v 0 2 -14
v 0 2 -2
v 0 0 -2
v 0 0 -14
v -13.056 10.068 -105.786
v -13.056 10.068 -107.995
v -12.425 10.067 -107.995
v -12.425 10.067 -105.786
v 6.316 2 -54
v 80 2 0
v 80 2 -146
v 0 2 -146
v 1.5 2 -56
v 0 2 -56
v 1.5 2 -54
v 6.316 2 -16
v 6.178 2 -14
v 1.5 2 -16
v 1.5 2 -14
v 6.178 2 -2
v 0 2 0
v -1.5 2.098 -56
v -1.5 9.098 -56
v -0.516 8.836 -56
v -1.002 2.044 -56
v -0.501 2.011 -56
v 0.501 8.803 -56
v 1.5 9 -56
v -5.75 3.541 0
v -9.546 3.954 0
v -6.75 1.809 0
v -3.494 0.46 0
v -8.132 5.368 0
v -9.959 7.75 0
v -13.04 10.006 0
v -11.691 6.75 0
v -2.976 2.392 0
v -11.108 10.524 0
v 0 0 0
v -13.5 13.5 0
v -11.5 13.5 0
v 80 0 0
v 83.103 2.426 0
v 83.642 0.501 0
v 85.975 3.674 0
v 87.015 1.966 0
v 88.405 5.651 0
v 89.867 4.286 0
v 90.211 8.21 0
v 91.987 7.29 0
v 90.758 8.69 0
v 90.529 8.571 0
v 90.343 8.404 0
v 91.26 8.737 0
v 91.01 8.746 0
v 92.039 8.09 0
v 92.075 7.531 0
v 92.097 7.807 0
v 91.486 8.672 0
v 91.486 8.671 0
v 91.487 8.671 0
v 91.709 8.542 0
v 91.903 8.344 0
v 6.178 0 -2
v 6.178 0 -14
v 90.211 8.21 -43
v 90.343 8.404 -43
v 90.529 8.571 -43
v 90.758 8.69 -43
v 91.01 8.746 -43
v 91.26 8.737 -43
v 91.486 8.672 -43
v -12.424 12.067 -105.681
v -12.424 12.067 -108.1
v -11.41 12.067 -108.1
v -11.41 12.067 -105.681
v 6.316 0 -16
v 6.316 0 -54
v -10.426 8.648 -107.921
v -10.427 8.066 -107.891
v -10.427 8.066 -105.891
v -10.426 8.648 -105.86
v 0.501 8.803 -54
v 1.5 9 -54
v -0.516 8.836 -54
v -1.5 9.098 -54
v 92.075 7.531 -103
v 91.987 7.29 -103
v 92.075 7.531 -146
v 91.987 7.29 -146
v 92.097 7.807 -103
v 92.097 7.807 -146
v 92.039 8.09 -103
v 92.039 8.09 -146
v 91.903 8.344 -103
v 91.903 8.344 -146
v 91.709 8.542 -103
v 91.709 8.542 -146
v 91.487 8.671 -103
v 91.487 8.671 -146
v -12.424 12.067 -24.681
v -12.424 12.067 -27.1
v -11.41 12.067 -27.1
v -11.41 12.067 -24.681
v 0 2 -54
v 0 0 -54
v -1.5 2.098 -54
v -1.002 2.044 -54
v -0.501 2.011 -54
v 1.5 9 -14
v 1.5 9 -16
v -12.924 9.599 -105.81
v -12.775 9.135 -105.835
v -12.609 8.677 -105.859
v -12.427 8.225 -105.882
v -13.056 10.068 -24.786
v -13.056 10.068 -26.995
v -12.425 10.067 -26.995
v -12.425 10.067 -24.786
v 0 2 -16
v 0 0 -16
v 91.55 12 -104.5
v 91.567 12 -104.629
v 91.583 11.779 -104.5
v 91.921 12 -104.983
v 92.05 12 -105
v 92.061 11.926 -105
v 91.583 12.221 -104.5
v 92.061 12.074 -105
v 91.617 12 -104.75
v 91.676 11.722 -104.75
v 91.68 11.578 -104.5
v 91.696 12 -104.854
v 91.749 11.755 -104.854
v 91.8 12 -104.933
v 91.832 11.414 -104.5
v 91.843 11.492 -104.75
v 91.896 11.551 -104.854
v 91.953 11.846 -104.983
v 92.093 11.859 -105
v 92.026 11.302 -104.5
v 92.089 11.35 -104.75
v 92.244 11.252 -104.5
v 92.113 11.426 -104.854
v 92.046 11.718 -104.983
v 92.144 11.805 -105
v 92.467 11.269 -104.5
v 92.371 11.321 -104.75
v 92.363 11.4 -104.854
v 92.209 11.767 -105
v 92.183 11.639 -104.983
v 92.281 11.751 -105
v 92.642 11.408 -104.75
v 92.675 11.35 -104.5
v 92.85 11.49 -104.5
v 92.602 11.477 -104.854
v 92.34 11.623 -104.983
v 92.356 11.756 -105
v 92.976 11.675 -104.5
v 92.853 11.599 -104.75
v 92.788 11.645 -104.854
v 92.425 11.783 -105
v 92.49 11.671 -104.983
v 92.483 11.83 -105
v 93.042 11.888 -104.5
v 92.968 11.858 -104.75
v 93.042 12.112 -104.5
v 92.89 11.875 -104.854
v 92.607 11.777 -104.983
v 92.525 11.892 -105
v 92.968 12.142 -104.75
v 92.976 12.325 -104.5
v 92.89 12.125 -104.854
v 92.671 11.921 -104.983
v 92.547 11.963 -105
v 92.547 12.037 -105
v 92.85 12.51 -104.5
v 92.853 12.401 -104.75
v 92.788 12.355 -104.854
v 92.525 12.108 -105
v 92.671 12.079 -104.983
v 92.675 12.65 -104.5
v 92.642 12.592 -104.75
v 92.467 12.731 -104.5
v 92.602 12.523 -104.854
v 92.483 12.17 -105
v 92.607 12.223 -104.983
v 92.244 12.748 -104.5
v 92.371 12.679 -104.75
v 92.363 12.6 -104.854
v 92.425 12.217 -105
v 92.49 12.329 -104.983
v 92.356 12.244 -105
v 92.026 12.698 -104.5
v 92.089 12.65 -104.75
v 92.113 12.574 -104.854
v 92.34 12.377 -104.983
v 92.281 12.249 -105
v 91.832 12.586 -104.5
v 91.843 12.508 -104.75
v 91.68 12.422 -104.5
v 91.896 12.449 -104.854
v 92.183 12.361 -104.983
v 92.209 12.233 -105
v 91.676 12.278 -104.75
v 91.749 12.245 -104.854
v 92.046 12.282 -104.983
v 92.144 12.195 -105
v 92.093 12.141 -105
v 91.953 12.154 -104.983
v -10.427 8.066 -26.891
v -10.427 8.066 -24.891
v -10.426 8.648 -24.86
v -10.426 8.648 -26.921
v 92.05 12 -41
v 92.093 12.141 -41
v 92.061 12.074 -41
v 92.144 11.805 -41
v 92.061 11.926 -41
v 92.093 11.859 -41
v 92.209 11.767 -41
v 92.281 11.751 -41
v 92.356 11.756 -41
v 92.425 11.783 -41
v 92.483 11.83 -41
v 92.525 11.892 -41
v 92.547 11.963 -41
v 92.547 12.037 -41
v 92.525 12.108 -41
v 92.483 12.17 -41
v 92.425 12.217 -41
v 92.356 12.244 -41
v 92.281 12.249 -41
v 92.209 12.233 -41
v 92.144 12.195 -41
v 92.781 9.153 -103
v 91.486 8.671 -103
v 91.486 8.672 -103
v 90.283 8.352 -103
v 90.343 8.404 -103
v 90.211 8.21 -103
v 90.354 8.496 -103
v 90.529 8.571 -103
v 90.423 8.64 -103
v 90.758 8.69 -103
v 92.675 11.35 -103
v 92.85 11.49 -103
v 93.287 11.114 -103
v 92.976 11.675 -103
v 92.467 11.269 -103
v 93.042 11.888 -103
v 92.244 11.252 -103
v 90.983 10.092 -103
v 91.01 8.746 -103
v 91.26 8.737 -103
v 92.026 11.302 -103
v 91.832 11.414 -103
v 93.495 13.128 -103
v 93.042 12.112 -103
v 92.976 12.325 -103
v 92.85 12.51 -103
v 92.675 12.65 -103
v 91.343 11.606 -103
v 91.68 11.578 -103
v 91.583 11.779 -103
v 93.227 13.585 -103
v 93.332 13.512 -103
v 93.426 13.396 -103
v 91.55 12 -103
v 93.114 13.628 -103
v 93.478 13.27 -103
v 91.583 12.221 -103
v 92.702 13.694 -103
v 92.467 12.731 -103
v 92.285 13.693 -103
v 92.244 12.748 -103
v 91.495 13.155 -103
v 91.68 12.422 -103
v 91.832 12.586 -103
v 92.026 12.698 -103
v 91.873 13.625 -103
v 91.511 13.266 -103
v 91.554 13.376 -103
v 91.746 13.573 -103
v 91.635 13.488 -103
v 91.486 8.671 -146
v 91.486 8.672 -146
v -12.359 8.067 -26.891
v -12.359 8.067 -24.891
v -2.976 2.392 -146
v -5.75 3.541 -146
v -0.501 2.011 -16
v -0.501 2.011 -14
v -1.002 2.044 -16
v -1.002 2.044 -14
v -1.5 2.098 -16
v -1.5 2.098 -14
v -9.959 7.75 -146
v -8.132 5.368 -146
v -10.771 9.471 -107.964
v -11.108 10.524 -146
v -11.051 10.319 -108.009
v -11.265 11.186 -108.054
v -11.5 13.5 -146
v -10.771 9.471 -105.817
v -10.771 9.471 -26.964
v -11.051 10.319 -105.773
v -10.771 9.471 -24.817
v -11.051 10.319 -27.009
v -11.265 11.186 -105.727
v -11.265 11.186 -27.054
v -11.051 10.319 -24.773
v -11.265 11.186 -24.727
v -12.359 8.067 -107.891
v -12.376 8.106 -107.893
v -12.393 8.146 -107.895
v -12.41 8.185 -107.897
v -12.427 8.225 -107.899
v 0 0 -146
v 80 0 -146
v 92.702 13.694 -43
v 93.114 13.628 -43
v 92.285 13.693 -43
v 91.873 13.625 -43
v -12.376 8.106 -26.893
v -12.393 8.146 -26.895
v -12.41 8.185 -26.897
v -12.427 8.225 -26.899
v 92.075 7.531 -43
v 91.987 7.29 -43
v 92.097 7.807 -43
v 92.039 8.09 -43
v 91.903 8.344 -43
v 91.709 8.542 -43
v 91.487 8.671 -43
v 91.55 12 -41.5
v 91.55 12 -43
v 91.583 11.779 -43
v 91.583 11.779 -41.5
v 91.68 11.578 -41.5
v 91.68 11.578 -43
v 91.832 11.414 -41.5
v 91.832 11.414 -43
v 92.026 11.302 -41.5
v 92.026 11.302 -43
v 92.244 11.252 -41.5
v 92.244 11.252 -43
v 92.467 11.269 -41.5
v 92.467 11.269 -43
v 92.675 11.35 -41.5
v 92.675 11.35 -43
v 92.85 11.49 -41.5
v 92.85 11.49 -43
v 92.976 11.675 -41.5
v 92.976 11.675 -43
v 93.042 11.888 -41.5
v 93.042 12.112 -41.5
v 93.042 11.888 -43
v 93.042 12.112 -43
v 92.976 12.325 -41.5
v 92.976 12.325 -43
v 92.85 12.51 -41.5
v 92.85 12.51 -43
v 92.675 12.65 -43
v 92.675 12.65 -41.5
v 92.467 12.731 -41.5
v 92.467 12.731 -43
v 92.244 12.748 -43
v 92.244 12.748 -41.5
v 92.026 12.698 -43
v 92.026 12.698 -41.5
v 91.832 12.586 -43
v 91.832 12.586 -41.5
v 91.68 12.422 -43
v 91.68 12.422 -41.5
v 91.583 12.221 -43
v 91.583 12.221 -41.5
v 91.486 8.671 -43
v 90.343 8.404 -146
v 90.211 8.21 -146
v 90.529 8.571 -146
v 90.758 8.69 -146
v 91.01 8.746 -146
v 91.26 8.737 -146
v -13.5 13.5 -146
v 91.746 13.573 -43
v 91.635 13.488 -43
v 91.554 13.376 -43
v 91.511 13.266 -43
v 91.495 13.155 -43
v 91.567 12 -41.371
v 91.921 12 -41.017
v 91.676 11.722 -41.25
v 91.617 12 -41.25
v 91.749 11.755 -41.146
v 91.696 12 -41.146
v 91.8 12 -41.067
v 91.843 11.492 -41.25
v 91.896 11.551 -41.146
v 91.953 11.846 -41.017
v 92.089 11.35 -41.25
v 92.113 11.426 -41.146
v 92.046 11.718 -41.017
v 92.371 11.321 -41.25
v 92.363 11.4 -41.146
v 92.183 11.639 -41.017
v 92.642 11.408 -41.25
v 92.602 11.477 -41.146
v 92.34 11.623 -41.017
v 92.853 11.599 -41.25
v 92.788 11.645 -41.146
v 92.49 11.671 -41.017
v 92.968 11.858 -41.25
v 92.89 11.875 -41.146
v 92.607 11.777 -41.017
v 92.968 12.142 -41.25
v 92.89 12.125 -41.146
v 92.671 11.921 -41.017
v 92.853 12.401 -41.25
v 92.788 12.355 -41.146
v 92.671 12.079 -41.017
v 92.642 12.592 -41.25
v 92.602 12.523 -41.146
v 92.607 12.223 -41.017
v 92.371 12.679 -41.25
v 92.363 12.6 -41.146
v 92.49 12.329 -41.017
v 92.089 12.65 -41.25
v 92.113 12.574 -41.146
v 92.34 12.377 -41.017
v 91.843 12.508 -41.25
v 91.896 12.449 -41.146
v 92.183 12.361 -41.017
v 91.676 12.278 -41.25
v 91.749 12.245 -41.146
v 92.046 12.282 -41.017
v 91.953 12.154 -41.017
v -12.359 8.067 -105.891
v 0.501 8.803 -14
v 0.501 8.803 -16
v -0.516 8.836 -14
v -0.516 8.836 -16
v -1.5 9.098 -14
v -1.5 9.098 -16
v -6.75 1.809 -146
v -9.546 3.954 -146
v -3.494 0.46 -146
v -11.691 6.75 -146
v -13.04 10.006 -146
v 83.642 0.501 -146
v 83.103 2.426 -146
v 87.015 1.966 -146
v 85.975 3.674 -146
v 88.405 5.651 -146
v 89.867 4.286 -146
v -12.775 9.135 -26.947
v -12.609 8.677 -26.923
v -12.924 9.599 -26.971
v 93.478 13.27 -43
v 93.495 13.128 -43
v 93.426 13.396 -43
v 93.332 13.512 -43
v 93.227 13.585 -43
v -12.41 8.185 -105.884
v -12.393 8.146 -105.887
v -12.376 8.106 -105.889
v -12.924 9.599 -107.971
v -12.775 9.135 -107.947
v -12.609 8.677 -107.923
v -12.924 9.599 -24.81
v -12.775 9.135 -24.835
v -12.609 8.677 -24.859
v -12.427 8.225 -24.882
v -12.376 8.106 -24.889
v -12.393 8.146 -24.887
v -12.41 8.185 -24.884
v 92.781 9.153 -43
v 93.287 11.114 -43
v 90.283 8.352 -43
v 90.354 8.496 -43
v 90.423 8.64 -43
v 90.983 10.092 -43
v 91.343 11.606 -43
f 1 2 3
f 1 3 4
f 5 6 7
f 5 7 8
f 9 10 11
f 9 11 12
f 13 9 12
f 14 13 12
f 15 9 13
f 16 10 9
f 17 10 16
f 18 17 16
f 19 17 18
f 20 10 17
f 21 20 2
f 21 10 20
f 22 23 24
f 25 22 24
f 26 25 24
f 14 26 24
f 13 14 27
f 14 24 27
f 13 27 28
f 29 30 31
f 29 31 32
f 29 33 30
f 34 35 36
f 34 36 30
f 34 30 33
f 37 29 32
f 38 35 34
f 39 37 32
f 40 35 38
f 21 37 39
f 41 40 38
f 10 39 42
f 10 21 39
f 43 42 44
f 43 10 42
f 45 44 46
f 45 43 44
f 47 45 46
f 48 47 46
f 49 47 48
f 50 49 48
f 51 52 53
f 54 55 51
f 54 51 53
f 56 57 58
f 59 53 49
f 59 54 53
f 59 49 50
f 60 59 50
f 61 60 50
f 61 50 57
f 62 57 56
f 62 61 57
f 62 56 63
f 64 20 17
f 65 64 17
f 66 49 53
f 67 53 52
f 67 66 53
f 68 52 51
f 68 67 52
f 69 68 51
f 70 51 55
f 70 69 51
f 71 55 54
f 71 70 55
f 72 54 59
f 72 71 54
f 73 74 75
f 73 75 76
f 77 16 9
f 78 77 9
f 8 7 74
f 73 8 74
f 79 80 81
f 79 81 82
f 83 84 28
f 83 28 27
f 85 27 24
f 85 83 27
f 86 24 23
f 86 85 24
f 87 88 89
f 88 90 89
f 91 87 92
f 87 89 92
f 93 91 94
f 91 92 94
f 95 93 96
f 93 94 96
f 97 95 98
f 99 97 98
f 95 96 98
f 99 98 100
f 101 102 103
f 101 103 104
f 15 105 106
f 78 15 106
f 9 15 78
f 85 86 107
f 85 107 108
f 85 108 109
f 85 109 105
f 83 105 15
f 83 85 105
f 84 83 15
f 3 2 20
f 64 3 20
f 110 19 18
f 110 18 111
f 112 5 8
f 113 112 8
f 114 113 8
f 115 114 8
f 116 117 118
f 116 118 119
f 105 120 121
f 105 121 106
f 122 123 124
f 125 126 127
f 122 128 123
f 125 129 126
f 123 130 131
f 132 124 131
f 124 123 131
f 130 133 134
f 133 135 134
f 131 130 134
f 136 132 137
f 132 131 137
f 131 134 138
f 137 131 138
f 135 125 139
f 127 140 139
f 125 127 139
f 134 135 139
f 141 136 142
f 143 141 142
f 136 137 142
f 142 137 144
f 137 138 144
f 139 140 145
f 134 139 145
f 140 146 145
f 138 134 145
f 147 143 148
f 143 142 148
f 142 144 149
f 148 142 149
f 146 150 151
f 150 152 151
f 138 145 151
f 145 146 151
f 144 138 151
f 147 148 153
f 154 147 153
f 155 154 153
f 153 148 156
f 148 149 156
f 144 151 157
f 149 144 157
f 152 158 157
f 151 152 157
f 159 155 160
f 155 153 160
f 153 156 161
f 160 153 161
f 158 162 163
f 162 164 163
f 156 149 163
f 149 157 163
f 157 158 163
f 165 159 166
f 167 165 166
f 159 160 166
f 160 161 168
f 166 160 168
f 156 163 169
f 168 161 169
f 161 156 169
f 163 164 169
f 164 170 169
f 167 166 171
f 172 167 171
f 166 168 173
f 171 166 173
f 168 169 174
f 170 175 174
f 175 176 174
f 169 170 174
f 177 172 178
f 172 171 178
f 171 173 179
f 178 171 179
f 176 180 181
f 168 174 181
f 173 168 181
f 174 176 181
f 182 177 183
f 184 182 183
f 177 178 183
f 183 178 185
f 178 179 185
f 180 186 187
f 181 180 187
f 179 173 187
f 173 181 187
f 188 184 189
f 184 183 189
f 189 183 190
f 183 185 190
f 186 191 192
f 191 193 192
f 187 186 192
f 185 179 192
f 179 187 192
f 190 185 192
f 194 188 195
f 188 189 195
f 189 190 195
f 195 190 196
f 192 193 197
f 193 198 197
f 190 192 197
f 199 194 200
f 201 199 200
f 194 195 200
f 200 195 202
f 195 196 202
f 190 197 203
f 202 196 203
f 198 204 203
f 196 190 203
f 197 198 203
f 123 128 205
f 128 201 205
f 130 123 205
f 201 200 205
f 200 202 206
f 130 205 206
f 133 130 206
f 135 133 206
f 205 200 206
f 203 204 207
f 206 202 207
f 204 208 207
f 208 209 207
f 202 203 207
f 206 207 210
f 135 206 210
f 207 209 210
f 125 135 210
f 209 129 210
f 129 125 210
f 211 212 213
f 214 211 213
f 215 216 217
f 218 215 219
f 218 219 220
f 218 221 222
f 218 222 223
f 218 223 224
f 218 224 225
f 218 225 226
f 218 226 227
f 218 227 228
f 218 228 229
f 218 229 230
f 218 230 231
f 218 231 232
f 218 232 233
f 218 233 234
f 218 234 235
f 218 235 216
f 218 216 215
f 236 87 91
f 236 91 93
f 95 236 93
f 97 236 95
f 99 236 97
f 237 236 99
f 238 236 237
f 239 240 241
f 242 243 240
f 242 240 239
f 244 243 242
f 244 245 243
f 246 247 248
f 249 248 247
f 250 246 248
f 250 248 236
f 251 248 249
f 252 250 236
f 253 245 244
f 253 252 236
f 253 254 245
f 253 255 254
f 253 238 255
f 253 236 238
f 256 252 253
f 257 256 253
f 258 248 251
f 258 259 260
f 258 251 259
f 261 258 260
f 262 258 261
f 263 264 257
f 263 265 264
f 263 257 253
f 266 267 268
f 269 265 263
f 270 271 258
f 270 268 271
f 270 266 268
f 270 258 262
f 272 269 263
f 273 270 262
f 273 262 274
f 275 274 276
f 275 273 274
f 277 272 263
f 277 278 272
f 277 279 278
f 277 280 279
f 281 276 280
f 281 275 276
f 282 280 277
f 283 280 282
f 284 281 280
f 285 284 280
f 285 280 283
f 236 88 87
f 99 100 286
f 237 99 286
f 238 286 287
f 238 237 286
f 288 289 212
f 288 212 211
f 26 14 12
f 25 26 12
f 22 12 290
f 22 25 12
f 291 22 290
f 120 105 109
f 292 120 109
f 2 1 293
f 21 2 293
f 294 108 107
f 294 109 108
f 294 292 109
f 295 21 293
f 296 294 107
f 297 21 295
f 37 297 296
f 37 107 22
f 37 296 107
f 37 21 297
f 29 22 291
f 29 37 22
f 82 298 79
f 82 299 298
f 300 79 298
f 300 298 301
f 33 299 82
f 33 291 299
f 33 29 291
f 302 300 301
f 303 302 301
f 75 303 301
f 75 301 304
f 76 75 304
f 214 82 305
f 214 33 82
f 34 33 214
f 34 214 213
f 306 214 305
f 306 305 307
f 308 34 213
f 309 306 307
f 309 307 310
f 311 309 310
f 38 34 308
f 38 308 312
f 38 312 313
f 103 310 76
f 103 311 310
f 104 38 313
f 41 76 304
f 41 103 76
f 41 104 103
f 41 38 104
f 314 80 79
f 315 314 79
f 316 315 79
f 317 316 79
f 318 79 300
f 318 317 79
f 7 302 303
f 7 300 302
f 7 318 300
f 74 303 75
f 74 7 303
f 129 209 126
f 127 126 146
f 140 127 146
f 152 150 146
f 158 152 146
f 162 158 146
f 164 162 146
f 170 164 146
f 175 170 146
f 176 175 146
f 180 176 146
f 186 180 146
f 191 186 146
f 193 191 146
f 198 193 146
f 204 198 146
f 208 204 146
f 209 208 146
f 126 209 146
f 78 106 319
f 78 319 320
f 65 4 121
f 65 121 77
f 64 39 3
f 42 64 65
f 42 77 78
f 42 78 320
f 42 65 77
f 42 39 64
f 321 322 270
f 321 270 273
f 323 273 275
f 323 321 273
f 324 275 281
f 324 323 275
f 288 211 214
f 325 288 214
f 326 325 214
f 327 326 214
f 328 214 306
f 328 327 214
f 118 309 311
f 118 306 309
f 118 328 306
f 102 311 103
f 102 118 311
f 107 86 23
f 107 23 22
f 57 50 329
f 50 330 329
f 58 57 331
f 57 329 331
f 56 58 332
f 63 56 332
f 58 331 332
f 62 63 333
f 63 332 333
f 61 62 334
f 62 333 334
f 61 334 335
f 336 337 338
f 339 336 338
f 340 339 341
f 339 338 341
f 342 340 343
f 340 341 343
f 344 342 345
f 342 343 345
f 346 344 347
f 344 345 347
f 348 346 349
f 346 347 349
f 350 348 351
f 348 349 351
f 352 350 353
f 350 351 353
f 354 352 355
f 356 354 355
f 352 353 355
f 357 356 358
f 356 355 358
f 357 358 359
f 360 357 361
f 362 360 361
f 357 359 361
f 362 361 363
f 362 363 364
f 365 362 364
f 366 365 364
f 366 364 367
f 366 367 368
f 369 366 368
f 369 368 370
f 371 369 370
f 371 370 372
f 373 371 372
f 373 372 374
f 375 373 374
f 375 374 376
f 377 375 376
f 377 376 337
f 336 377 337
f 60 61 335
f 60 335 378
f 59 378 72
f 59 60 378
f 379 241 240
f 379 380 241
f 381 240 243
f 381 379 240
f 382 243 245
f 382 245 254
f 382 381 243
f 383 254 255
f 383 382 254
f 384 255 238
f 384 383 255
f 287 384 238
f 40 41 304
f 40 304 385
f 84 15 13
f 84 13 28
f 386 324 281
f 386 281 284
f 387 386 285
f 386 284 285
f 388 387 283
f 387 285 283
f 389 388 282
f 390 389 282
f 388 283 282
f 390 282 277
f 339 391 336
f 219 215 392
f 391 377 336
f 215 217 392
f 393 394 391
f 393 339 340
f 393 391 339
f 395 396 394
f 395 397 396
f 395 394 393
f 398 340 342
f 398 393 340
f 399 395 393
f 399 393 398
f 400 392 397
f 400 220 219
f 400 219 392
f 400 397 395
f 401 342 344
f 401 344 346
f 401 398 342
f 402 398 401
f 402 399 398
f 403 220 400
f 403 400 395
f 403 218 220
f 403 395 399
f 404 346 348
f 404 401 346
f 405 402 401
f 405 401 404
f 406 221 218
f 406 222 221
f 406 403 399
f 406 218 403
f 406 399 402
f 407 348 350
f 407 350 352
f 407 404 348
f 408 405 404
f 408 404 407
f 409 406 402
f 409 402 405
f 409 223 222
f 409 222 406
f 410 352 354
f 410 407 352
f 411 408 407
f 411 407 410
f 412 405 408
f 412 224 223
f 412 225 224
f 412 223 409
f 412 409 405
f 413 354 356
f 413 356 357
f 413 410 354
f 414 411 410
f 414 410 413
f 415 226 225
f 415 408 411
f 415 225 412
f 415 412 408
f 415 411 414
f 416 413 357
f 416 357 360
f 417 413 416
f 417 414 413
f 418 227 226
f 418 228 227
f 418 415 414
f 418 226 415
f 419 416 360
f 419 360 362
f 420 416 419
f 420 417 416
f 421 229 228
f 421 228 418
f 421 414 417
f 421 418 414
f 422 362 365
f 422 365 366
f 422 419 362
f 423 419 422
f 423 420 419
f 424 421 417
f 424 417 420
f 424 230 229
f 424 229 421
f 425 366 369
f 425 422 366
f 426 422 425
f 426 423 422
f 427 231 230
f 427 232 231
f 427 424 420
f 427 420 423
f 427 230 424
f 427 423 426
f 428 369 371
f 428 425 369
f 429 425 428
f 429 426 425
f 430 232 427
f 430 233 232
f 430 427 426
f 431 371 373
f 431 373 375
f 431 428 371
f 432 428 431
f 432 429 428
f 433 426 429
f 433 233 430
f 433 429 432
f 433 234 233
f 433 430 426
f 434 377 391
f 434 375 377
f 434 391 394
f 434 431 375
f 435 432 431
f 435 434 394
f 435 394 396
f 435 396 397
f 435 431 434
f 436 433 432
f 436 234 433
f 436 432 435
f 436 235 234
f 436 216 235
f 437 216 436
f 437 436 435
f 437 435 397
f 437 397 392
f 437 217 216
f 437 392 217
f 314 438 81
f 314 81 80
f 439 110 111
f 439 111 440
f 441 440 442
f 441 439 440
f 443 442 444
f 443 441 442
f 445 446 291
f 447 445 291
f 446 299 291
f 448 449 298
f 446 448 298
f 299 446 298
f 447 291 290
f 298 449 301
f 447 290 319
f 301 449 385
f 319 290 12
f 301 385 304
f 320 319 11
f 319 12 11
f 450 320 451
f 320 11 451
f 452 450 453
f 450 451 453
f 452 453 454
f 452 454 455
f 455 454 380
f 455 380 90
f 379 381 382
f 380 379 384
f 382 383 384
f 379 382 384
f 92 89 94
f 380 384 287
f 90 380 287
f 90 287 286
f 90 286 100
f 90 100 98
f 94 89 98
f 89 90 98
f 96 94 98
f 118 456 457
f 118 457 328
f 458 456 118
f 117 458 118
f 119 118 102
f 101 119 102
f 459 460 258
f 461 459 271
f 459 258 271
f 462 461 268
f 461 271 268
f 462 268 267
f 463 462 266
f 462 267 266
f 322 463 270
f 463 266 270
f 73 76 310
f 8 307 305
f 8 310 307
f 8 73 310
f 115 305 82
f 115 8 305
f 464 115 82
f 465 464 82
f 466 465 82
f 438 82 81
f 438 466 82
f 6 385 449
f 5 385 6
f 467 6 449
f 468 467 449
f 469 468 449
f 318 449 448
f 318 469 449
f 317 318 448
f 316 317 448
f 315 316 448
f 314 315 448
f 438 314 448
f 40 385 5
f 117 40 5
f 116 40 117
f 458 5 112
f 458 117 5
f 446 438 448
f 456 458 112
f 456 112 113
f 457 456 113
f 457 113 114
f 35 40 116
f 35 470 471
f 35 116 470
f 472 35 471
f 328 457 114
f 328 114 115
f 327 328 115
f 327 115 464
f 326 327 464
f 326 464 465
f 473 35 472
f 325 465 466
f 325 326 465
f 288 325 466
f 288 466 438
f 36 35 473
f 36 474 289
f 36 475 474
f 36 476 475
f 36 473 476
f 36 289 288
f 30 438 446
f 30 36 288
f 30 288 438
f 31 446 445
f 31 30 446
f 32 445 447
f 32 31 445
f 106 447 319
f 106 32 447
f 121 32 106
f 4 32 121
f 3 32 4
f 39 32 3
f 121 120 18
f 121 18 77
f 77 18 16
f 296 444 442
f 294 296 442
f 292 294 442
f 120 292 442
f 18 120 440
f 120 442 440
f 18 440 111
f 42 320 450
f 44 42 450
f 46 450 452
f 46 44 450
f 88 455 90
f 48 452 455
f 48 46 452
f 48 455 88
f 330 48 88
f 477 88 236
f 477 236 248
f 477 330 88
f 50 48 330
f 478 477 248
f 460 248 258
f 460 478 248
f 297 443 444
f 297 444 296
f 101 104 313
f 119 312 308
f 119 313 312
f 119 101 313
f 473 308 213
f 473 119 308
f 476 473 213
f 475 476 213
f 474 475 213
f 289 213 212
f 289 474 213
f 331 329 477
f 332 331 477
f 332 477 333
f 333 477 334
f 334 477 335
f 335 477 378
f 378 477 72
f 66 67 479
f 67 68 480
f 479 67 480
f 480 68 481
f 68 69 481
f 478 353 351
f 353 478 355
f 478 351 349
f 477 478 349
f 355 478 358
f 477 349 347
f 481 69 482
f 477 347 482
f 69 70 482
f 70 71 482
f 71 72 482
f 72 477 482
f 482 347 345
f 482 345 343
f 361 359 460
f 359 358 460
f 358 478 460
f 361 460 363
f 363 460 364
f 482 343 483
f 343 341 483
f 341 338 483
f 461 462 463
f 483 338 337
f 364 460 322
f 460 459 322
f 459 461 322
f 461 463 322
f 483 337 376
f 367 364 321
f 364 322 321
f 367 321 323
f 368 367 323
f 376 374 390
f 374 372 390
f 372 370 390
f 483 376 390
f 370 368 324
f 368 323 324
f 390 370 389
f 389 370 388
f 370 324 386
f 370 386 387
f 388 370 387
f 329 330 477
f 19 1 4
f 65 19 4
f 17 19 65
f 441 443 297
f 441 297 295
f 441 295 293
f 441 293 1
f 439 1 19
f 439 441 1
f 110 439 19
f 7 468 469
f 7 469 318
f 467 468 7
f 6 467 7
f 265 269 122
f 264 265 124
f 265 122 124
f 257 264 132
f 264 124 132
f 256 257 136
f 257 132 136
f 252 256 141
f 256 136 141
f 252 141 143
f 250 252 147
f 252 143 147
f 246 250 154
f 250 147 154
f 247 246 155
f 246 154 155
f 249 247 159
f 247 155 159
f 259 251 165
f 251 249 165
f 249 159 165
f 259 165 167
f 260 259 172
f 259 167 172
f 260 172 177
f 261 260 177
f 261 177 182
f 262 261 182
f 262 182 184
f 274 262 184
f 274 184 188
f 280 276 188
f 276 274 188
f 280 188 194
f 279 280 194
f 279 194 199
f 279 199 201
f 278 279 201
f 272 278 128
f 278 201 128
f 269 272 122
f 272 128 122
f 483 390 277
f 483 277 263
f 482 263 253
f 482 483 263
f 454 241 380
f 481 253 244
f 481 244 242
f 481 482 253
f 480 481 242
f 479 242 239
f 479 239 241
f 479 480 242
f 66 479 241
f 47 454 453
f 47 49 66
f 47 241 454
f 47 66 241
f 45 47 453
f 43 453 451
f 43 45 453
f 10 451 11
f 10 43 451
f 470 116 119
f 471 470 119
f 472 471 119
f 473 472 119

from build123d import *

# Parameters (mm, degrees)
BASE_DEPTH             = 146
HINGE_CUT_DEPTH        = 43
HINGE_START            = -103
HINGE_CUT_2_DEPTH      = 43
HINGE_START_2          = -62
SKETCH3_R              = 0.75
HINGE_EXTRUSIONS_DEPTH = 64
FILLET5_R              = 0.5
FILLET6_R              = 0.5
SYRINGE_START          = -92
SYRINGE_HOLDER_DEPTH   = 2
LPATTERN4_COUNT        = 2
LPATTERN4_PITCH        = 40
FILLET7_R              = 1
FILLET8_R              = 0.5
SNAP_START             = -12.431858348
SNAP_GROOVE1_DEPTH     = 2
SNAP_START_2           = -13.062831461
SNAP_GROOVE1_2_DEPTH   = 0.630973113
LPATTERN5_COUNT        = 2
LPATTERN5_PITCH        = 81
SKETCH6_W              = 6.31577628
SKETCH6_H              = 38
VISIBILITY_DEPTH       = 2
SKETCH7_W              = 6.177782062
SKETCH7_H              = 12
CUT_EXTRUDE4_DEPTH     = 2


# Read off the part's stored shape, not the designer's step: Snap Groove1
with BuildPart() as part:
    # Sketch1 → Base (new body)
    with BuildSketch(Plane.XY):
        with BuildLine():
            Line((0, 0), (80, 0))
            ThreePointArc((80, 0), (89.545941546, 3.954058454), (93.5, 13.5))
            ThreePointArc((93.5, 13.5), (92.5, 13.70219929), (91.5, 13.5))
            ThreePointArc((91.5, 13.5), (88.131727984, 5.368272016), (80, 2))
            Line((80, 2), (0, 2))
            ThreePointArc((0, 2), (-8.131727984, 5.368272016), (-11.5, 13.5))
            Line((-11.5, 13.5), (-13.5, 13.5))
            ThreePointArc((-13.5, 13.5), (-9.545941546, 3.954058454), (0, 0))
        make_face()
    extrude(amount=-BASE_DEPTH)

    # Sketch2 → Hinge cut (cut)
    with BuildSketch(Plane.XY):
        with BuildLine():
            ThreePointArc((93.5, 13.5), (93.179996096, 10.578065212), (92.235155125, 7.794653467))
            ThreePointArc((92.235155125, 7.794653467), (91.53133512, 8.651508178), (90.422539551, 8.63988999))
            ThreePointArc((90.422539551, 8.63988999), (91.227404082, 11.01094444), (91.5, 13.5))
            ThreePointArc((91.5, 13.5), (92.5, 13.914213562), (93.5, 13.5))
        make_face()
    extrude(amount=-HINGE_CUT_DEPTH, mode=Mode.SUBTRACT)

    # Sketch2<2> → Hinge cut 2 (cut)
    with BuildSketch(Plane.XY.offset(HINGE_START)):
        with BuildLine():
            ThreePointArc((93.5, 13.5), (93.179996096, 10.578065212), (92.235155125, 7.794653467))
            ThreePointArc((92.235155125, 7.794653467), (91.53133512, 8.651508178), (90.422539551, 8.63988999))
            ThreePointArc((90.422539551, 8.63988999), (91.227404082, 11.01094444), (91.5, 13.5))
            ThreePointArc((91.5, 13.5), (92.5, 13.914213562), (93.5, 13.5))
        make_face()
    extrude(amount=-HINGE_CUT_2_DEPTH, mode=Mode.SUBTRACT)

    # Sketch3 → hinge extrusions (add)
    with BuildSketch(Plane.XY.offset(-43).offset(HINGE_START_2)):
        with Locations(Location((92.3, 12, 0), (0, 0, 180))):
            Circle(SKETCH3_R)
    extrude(amount=HINGE_EXTRUSIONS_DEPTH)

    # Fillet5
    fillet5_edges = [part.edges().sort_by_distance(p)[0] for p in [
        (93.05, 12, -105),
    ]]
    fillet(fillet5_edges, radius=FILLET5_R)

    # Fillet6
    fillet6_edges = [part.edges().sort_by_distance(p)[0] for p in [
        (93.05, 12, -41),
    ]]
    fillet(fillet6_edges, radius=FILLET6_R)

    # Sketch5 → Syringe holder (add)
    with BuildSketch(Plane(origin=(0, 0, -146), x_dir=(-1, 0, 0), z_dir=(0, 0, -1)).offset(SYRINGE_START)):
        with BuildLine():
            Line((0, 2), (-1.5, 2))
            Line((-1.5, 2), (-1.5, 9))
            ThreePointArc((-1.5, 9), (0.0084764, 8.790290315), (1.5, 9.098245749))
            Line((1.5, 9.098245749), (1.5, 2.098245749))
            ThreePointArc((1.5, 2.098245749), (0.751606983, 2.024587722), (0, 2))
        make_face()
    syringe_holder = extrude(amount=SYRINGE_HOLDER_DEPTH)

    # LPattern4: Syringe holder ×2
    with Locations(*[(0, 0, i * LPATTERN4_PITCH) for i in range(1, LPATTERN4_COUNT)]):
        add(syringe_holder)

    # Fillet7
    fillet7_edges = [part.edges().sort_by_distance(p)[0] for p in [
        (92.235155125, 7.794653467, -21.5),
        (90.422539551, 8.63988999, -21.5),
        (92.235155125, 7.794653467, -124.5),
        (90.422539551, 8.63988999, -124.5),
    ]]
    fillet(fillet7_edges, radius=FILLET7_R - 0.0001)  # a hair under: the kernel refuses the full size

    # Fillet8
    fillet8_edges = [part.edges().sort_by_distance(p)[0] for p in [
        (93.5, 13.5, -73),
        (91.5, 13.5, -73),
    ]]
    fillet(fillet8_edges, radius=FILLET8_R)

    # Snap Groove1 outline → Snap Groove1 (cut)
    with BuildSketch(Plane(origin=(0, 0, 0), x_dir=(0.0006419218138647702, 0.9999997939681713, 0), z_dir=(0.9999997939681713, -0.0006419218138647702, 0)).offset(SNAP_START)):
        Polygon((8.059246911, -107.890634842), (12.059246911, -108.100265959), (12.059246911, -105.681003725), (8.059246911, -105.890634842), align=None)
    snap_groove1 = extrude(amount=SNAP_GROOVE1_DEPTH, mode=Mode.SUBTRACT)

    # Snap Groove1 2 outline → Snap Groove1 2 (cut)
    with BuildSketch(Plane(origin=(0, 0, 0), x_dir=(0.0006419218138647702, 0.9999997939681713, 0), z_dir=(0.9999997939681713, -0.0006419218138647702, 0)).offset(SNAP_START_2)):
        Polygon((8.059246911, -107.890634842), (10.059246911, -107.9954504), (10.059246911, -105.785819283), (8.059246911, -105.890634842), align=None)
    snap_groove1_2 = extrude(amount=SNAP_GROOVE1_2_DEPTH, mode=Mode.SUBTRACT)

    # LPattern5: Snap Groove1, Snap Groove1 2 ×2
    with Locations(*[(0, 0, i * LPATTERN5_PITCH) for i in range(1, LPATTERN5_COUNT)]):
        add(snap_groove1, mode=Mode.SUBTRACT)
        add(snap_groove1_2, mode=Mode.SUBTRACT)

    # Sketch6 → Visibility (cut)
    with BuildSketch(Plane(origin=(0, 2, 0), x_dir=(1, 0, 0), z_dir=(0, 1, 0))):
        with Locations((3.15788814, 35)):
            Rectangle(SKETCH6_W, SKETCH6_H)
    extrude(amount=-VISIBILITY_DEPTH, mode=Mode.SUBTRACT)

    # Sketch7 → Cut-Extrude4 (cut)
    with BuildSketch(Plane(origin=(0, 2, 0), x_dir=(1, 0, 0), z_dir=(0, 1, 0))):
        with Locations((3.088891031, 8)):
            Rectangle(SKETCH7_W, SKETCH7_H)
    extrude(amount=-CUT_EXTRUDE4_DEPTH, mode=Mode.SUBTRACT)


solid = part.part
